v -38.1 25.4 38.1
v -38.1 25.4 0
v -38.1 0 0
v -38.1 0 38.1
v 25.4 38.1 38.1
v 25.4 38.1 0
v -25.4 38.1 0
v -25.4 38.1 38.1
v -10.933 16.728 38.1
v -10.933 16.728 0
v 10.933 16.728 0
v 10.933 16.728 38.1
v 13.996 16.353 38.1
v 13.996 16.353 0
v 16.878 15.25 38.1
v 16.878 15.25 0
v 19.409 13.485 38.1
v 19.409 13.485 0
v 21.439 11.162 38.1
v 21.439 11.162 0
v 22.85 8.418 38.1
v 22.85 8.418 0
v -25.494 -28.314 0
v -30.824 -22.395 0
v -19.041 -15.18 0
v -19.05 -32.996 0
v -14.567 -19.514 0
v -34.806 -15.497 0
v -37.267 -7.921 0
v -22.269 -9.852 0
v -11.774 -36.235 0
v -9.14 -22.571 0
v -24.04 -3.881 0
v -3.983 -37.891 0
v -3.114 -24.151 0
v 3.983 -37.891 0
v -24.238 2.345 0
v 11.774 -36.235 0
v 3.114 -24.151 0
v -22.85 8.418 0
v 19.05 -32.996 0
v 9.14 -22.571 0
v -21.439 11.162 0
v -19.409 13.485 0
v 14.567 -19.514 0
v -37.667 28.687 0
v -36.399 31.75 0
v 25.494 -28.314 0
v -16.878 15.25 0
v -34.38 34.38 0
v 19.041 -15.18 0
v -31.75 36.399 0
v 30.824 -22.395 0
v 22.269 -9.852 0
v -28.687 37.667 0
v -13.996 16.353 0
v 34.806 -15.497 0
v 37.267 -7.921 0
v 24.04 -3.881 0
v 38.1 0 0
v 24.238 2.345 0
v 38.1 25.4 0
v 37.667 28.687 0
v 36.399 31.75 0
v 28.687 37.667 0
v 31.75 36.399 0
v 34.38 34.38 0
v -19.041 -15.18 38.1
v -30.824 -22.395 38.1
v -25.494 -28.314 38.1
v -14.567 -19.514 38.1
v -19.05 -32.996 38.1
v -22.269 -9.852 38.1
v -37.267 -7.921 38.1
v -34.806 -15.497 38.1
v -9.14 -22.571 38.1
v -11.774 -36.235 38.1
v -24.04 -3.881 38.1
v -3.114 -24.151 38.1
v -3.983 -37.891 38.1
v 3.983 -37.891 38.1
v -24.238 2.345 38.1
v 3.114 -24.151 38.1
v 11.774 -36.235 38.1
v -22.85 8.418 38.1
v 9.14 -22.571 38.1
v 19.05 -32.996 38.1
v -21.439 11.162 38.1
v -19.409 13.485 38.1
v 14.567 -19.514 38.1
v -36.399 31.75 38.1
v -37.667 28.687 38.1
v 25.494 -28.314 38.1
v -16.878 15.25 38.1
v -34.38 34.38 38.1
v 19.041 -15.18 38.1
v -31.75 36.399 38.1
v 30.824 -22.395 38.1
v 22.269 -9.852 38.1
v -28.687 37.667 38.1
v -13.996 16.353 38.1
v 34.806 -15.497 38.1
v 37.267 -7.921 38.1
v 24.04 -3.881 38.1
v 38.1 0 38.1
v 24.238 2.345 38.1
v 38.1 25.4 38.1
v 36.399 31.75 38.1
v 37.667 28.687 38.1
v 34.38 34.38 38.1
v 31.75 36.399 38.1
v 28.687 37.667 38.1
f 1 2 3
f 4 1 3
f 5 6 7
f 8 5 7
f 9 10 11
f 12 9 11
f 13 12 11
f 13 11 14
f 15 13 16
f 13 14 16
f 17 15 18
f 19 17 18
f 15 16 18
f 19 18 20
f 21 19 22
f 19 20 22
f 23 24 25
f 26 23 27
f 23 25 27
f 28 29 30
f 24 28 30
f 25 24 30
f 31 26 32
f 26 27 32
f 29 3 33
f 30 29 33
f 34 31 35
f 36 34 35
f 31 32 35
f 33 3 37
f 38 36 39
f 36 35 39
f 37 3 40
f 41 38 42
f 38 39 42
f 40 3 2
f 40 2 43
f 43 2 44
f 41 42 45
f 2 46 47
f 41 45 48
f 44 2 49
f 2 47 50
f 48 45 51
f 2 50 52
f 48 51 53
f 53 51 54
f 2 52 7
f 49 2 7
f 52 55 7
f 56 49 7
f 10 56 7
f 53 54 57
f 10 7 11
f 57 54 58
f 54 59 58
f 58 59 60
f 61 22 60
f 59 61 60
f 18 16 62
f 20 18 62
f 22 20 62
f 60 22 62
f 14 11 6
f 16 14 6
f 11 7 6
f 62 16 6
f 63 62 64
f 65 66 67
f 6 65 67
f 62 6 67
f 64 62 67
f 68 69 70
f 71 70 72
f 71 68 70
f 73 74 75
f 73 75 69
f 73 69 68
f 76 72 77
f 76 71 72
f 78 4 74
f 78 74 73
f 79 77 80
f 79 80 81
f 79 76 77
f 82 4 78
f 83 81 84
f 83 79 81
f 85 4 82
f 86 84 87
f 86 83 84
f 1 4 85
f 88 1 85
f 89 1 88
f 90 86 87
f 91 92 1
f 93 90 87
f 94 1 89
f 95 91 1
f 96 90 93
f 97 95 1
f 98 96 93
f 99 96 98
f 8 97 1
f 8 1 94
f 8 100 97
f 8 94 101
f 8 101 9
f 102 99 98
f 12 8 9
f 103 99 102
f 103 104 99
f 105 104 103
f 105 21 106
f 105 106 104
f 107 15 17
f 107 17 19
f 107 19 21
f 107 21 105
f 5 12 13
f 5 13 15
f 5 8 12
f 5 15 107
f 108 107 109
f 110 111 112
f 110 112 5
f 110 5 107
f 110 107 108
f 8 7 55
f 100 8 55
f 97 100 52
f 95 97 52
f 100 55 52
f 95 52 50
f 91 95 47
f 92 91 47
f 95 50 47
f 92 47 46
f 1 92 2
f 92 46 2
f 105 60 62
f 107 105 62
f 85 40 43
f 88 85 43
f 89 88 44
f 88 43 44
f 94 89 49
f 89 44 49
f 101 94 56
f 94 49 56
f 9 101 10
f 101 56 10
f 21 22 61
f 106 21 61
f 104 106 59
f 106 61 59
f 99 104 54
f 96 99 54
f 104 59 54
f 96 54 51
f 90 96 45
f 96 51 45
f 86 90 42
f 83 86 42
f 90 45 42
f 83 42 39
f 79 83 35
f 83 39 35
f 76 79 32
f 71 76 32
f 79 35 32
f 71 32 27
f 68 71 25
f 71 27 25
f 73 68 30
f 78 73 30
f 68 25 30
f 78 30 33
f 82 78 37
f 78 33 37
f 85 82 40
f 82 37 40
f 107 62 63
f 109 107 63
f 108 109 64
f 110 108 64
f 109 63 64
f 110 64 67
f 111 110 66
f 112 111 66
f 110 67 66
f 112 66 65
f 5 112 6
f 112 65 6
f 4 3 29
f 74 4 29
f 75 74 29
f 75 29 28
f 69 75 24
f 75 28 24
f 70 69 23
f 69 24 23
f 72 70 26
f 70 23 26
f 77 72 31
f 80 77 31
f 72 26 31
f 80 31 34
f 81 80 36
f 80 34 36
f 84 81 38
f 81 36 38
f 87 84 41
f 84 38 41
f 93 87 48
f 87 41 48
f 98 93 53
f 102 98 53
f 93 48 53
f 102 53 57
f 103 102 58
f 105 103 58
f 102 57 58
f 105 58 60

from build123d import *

# Parameters (mm, degrees)
F1_DEPTH = 38.1


with BuildPart() as f1:
    # F0 (on Top) → F1 (new body)
    with BuildSketch(Plane.XY):
        with BuildLine():
            Line((-38.1, 25.4), (-38.1, 0))
            ThreePointArc((-38.1, 0), (0, -38.1), (38.1, 0))
            Line((38.1, 0), (38.1, 25.4))
            ThreePointArc((38.1, 25.4), (34.380256, 34.380256), (25.4, 38.1))
            Line((25.4, 38.1), (0, 38.1))
            Line((0, 38.1), (-25.4, 38.1))
            ThreePointArc((-25.4, 38.1), (-34.380256, 34.380256), (-38.1, 25.4))
        make_face()
        with BuildLine():
            ThreePointArc((22.849819, 8.417652), (0, -24.350998), (-22.849819, 8.417652))
            ThreePointArc((-22.849819, 8.417652), (-18.196877, 14.444923), (-10.932743, 16.727516))
            Line((-10.932743, 16.727516), (0, 16.727516))
            Line((0, 16.727516), (10.932743, 16.727516))
            ThreePointArc((10.932743, 16.727516), (18.196877, 14.444923), (22.849819, 8.417652))
        make_face(mode=Mode.SUBTRACT)
    extrude(amount=F1_DEPTH)


solid = f1.part
